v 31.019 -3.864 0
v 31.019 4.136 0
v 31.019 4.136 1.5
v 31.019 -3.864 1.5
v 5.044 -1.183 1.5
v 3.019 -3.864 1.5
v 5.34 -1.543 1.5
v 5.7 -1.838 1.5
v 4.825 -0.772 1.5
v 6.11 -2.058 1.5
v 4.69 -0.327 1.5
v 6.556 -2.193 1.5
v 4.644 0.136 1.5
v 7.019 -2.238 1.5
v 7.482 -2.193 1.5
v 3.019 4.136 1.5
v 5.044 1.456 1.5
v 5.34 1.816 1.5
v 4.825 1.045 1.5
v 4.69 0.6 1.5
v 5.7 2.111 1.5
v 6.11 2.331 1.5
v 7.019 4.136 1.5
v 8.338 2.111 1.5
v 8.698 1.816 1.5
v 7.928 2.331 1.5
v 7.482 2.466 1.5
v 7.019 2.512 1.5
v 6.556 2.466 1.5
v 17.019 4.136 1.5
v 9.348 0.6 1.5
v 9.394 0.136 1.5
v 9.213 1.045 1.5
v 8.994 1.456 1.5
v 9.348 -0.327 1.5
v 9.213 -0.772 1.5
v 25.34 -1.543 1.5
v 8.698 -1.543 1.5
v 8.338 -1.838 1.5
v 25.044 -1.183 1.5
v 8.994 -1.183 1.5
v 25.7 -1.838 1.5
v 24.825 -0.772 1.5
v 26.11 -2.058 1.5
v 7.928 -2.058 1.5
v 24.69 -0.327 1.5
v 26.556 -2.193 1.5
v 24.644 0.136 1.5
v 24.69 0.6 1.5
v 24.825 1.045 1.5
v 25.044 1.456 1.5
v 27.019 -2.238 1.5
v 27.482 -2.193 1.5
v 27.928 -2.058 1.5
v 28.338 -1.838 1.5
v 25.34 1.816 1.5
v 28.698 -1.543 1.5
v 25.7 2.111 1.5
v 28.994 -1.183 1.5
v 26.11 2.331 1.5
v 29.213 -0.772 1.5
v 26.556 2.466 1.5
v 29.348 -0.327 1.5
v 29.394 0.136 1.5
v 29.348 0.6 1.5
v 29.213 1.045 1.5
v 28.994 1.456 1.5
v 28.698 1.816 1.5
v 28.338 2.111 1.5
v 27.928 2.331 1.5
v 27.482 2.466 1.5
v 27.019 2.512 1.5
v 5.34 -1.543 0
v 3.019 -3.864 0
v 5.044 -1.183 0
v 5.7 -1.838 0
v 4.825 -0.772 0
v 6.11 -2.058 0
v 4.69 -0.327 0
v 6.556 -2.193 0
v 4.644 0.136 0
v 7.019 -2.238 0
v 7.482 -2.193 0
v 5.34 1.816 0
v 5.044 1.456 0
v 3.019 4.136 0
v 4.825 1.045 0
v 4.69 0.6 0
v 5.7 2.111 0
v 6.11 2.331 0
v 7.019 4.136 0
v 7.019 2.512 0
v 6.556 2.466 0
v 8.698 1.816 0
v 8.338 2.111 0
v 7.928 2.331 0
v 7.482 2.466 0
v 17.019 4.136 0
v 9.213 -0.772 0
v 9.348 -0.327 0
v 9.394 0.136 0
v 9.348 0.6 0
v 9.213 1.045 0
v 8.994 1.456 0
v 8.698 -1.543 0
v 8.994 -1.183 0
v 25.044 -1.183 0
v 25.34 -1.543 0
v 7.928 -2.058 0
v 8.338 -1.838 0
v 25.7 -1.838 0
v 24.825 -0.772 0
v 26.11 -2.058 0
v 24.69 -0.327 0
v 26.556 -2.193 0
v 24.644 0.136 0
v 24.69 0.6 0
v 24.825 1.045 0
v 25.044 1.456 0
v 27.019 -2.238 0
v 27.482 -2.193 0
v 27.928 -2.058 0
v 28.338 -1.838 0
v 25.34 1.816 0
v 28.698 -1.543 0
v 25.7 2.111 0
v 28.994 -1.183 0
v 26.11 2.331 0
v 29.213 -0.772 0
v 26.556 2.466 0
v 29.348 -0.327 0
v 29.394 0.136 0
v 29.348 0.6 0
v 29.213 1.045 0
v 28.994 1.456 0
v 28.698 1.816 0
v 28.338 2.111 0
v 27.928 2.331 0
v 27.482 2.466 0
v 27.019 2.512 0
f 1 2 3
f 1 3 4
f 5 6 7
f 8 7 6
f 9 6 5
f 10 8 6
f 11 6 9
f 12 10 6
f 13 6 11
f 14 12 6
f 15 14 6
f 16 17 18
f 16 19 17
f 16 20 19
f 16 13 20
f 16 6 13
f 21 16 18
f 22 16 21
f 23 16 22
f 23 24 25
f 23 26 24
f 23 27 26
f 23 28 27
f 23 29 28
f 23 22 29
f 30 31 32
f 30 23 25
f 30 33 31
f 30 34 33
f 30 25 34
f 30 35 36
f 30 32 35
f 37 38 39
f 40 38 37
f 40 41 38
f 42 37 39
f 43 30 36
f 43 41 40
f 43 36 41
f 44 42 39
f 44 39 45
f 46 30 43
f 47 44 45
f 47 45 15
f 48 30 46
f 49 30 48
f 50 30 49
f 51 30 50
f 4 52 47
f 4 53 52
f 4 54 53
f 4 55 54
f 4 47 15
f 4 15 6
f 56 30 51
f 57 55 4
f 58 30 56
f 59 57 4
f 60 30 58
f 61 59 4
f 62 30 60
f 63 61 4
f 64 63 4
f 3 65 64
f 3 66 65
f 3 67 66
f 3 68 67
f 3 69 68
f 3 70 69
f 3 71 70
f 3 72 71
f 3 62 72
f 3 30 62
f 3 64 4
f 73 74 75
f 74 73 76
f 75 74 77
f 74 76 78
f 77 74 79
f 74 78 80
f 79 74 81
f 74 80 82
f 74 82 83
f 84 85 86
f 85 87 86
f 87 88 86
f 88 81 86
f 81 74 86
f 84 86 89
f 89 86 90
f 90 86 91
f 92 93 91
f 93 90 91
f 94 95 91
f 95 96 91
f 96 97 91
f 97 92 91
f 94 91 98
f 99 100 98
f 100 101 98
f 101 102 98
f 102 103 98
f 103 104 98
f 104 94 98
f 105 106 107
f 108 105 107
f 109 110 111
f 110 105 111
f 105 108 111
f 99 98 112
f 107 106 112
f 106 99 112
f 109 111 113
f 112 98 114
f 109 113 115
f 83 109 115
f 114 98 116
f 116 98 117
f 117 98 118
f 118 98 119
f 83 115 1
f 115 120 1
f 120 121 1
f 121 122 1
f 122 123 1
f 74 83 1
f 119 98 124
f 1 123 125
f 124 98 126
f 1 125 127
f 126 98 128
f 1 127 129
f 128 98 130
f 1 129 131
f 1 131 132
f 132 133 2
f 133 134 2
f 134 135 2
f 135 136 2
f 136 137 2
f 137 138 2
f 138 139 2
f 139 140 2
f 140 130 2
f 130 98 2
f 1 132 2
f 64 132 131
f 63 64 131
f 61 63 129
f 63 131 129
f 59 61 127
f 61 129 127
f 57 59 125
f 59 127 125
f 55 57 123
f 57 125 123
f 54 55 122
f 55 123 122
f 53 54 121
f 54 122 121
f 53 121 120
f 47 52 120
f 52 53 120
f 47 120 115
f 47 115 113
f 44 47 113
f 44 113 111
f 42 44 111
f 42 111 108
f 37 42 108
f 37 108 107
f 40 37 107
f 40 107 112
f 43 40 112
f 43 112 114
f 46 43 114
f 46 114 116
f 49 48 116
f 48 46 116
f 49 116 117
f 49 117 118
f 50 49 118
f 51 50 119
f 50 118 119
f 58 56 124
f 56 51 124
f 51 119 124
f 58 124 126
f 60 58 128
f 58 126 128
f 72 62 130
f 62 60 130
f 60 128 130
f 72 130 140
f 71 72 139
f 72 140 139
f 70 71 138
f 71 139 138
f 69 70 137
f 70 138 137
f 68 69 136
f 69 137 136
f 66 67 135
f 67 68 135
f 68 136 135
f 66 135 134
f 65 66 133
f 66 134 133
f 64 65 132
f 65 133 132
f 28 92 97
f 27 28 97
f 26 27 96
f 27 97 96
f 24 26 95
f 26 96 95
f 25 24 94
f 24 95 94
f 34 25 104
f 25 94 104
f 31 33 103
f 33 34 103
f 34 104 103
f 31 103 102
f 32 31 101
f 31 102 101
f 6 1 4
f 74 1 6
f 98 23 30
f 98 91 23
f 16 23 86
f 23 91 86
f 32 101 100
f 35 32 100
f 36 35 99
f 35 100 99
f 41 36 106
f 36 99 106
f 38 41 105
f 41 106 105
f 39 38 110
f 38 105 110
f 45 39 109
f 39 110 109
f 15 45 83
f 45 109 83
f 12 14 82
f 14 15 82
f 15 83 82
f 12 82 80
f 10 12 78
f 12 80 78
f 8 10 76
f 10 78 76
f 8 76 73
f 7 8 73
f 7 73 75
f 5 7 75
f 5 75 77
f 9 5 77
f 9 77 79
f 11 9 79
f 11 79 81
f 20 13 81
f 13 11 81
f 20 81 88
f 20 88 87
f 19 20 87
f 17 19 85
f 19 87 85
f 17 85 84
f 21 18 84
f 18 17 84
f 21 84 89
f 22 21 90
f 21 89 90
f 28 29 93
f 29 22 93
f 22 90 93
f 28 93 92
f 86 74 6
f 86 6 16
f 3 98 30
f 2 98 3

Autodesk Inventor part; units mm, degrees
ref_plane "YZ Plane" through (0, 0, 0) normal (1, 0, 0) x (0, 1, 0)
ref_plane "XZ Plane" through (0, 0, 0) normal (0, 1, 0) x (-1, 0, 0)
ref_plane "XY Plane" through (0, 0, 0) normal (0, 0, 1) x (1, 0, 0)
sketch "Sketch2" plane through (0, 0, 0) normal (0, 0, 1) x (1, 0, 0)
  circle A0 centre (7.019, 0.1365) radius 2.125 projected
  circle A1 centre (7.019, 0.1365) radius 2.375
  line L0 (7.019, 0.1365) -> (7.019, 4.1365)
  line L1 (7.019, 4.1365) -> (3.019, 4.1365)
  line L2 (3.019, 4.1365) -> (31.019, 4.1365)
  line L3 (31.019, 4.1365) -> (31.019, -3.8635)
  line L4 (31.019, -3.8635) -> (3.019, -3.8635)
  line L5 (3.019, -3.8635) -> (3.019, 4.1365)
  line L6 (17.019, 4.1365) -> (17.019, 2)
  circle A2 centre (27.019, 0.1365) radius 2.375
  point P0 (0, 0)
  dimension "d0" = 4.75
  dimension "d1" = 4
  dimension "d2" = 4
  dimension "d3" = 28
  dimension "d4" = 8
extrude "Extrusion1" add sketch "Sketch2" along normal blind 1.5 contours L2 L3 L4 L5 L1
properties part number "Connector"
